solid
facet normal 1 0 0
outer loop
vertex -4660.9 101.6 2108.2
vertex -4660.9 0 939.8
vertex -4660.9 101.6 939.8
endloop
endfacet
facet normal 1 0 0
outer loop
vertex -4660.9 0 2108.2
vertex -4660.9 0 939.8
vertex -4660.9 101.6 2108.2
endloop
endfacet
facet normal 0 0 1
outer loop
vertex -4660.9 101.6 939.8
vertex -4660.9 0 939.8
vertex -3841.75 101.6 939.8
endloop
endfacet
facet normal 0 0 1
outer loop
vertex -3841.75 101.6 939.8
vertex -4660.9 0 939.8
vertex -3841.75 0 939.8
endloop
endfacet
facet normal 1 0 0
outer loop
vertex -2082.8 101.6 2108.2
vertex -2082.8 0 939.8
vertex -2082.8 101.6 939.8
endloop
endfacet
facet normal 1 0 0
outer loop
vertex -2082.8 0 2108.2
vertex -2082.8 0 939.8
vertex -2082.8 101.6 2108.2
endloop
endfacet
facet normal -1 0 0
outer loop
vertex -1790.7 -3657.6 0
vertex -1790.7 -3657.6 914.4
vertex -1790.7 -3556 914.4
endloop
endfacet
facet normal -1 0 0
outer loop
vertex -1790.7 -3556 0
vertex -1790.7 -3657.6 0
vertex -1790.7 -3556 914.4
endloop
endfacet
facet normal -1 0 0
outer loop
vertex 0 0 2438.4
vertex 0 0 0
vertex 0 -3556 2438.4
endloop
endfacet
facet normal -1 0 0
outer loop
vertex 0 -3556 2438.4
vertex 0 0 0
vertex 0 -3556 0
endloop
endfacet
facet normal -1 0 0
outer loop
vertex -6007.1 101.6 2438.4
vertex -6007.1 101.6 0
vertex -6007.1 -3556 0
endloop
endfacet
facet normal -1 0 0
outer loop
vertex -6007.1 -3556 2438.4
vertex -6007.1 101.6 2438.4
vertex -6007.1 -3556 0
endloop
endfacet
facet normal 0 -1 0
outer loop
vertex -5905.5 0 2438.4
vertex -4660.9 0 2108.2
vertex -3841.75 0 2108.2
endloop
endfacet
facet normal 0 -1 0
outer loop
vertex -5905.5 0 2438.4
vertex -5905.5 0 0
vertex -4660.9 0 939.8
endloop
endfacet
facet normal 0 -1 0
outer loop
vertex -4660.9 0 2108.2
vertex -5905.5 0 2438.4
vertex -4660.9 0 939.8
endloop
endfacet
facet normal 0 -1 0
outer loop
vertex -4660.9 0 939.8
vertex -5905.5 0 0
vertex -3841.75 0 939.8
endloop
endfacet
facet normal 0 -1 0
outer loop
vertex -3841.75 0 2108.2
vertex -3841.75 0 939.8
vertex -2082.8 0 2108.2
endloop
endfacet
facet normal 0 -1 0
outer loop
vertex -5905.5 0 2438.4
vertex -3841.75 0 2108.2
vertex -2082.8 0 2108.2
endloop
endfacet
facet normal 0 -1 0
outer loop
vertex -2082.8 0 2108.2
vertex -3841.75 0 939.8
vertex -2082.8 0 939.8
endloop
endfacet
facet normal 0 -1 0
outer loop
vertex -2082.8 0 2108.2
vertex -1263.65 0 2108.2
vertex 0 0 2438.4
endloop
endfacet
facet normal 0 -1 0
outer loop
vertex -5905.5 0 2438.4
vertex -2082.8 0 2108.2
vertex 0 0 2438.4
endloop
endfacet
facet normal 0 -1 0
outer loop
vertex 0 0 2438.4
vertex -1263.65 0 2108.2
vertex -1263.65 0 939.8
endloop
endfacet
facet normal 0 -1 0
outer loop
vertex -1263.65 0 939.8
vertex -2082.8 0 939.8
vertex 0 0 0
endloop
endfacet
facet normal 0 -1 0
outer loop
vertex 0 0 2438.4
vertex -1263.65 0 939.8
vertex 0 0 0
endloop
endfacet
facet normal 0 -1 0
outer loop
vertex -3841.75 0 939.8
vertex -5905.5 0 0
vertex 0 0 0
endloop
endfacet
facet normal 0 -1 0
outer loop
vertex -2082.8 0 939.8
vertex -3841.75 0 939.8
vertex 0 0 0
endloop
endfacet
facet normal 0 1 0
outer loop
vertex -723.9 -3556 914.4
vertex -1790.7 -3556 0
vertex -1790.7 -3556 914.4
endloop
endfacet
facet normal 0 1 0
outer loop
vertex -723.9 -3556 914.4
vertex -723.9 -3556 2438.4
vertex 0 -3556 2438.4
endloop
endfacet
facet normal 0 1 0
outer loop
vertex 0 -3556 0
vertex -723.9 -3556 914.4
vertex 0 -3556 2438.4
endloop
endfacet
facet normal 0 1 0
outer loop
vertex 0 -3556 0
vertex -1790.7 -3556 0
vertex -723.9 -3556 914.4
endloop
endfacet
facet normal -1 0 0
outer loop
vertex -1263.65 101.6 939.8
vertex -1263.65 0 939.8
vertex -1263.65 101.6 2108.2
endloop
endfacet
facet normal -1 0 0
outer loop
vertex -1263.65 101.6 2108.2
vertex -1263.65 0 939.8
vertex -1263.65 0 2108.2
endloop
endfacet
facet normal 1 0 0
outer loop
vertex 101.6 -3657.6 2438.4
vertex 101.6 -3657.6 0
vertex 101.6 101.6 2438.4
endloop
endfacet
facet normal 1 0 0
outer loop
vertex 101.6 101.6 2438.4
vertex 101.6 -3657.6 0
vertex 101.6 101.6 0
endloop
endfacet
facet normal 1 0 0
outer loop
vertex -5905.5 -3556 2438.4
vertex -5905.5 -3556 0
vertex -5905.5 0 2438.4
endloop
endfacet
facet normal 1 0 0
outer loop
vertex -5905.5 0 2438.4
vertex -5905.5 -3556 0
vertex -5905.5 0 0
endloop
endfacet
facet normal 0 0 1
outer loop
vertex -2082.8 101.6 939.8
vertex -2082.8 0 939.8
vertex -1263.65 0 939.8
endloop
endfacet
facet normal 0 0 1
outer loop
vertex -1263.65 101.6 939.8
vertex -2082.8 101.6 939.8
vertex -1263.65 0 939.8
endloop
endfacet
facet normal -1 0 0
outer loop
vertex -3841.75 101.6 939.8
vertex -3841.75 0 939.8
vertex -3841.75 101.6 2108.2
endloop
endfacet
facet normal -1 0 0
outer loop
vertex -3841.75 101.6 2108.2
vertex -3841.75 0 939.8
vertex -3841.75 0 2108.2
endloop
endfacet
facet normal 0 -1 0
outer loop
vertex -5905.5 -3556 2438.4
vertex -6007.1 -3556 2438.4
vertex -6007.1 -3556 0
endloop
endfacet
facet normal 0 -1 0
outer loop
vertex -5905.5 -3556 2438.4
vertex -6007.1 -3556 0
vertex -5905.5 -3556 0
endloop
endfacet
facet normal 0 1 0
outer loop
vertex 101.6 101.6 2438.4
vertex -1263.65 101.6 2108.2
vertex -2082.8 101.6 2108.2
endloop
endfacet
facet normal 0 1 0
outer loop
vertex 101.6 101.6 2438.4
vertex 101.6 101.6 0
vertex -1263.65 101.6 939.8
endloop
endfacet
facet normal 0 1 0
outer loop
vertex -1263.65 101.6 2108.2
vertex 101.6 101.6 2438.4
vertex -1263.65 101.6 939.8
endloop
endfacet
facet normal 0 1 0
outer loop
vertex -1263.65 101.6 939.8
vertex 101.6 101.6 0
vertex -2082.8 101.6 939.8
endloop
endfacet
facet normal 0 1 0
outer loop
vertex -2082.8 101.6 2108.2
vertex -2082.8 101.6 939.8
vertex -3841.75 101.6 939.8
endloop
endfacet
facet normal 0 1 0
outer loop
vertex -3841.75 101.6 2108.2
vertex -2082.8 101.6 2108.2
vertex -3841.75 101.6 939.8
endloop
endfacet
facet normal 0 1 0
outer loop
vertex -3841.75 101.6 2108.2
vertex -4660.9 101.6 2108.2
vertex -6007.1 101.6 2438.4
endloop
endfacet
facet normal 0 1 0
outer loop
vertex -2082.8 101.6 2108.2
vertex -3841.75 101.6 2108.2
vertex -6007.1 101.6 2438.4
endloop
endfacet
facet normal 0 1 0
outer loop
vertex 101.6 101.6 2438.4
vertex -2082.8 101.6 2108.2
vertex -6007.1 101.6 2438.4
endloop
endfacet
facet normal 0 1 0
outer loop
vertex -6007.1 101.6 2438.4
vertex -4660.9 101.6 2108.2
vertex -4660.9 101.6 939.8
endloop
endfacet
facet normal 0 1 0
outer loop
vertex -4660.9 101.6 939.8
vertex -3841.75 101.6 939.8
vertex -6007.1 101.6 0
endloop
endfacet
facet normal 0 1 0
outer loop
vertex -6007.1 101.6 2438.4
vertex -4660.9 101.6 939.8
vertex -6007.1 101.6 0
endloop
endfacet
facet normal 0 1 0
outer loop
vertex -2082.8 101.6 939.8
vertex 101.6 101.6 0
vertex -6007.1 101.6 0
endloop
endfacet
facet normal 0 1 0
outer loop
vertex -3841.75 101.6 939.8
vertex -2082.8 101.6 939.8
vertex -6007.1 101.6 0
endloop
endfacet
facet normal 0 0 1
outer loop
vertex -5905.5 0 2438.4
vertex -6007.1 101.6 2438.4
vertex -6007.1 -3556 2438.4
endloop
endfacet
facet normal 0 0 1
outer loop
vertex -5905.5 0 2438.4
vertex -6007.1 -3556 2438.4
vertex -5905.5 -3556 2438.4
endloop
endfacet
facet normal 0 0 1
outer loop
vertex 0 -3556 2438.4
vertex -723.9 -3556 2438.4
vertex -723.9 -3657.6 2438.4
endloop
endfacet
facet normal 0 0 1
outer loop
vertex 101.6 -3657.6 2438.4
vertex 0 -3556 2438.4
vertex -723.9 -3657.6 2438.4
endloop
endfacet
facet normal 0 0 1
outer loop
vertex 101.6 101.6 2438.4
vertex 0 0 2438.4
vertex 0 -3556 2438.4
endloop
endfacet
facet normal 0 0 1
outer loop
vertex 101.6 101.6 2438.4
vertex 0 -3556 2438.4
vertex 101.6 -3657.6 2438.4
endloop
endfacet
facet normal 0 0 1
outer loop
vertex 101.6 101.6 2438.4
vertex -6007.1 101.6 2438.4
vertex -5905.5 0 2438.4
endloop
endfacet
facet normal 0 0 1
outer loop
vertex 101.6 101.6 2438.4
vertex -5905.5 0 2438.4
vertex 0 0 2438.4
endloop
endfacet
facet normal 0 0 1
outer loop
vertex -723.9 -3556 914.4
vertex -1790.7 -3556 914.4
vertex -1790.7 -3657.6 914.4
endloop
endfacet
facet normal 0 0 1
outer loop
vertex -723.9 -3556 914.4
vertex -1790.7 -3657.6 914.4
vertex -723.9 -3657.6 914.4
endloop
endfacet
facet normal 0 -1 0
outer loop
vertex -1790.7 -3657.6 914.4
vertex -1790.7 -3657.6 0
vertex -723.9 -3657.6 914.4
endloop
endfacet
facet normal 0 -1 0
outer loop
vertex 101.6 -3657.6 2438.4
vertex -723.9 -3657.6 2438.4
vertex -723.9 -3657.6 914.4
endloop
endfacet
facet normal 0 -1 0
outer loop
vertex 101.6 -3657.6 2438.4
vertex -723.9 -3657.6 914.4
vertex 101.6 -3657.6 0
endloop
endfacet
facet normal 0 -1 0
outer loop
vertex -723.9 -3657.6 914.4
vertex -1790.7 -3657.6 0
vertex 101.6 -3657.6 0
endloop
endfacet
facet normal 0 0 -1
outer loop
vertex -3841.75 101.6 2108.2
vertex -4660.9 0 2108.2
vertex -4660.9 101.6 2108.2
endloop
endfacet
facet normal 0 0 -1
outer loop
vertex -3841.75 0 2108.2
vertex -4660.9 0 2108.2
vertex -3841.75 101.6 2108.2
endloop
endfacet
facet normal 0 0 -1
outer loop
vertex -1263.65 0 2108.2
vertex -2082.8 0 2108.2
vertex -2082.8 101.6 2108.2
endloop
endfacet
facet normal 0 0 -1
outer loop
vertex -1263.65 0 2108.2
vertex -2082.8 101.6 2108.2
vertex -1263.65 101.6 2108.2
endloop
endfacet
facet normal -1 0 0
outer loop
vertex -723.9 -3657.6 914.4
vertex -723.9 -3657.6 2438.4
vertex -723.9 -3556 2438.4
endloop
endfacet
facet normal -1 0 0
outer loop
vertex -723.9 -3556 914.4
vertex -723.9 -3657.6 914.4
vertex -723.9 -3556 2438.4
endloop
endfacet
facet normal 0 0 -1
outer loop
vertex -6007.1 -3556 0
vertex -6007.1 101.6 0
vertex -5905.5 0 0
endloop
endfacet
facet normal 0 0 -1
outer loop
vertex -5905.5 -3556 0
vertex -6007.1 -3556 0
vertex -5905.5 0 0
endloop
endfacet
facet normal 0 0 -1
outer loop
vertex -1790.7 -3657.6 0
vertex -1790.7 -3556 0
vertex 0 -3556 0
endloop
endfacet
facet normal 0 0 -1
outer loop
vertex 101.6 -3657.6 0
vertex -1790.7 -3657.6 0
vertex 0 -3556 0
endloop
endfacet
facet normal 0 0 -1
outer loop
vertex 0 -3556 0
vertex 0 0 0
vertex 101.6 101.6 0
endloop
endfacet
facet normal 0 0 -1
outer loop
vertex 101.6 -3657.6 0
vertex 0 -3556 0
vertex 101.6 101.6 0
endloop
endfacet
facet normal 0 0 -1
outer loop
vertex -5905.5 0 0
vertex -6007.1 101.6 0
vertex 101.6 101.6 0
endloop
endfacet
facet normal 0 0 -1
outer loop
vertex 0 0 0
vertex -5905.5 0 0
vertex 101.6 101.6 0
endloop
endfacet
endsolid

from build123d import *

# Parameters (mm, degrees)
F0_W     = 723.9
F0_H     = 101.6
F0_W_2   = 101.6
F0_H_2   = 3556
F0_W_3   = 5905.5
F1_DEPTH = 2438.4
F2_W     = 1066.8
F2_H     = 101.6
F3_DEPTH = 914.4
F4_W     = 819.15
F4_H     = 1168.4
F5_DEPTH = 101.6


with BuildPart() as f1:
    # F0 (on Top) → F1 (new body)
    with BuildSketch(Plane.XY):
        with Locations((-361.95, -3606.8)):
            Rectangle(F0_W, F0_H)
        with Locations((50.8, -3606.8)):
            Rectangle(F0_W_2, F0_H)
        with Locations((50.8, -1778)):
            Rectangle(F0_W_2, F0_H_2)
        with Locations((50.8, 50.8)):
            Rectangle(F0_W_2, F0_H)
        with Locations((-2952.75, 50.8)):
            Rectangle(F0_W_3, F0_H)
        Polygon((-5905.5, -3556), (-5905.5, 0), (-5905.5, 101.6), (-6007.1, 101.6), (-6007.1, -3556), align=None)
    extrude(amount=F1_DEPTH)

    # F2 (on Top) → F3 (join)
    with BuildSketch(Plane.XY):
        with Locations((-1257.3, -3606.8)):
            Rectangle(F2_W, F2_H)
    extrude(amount=F3_DEPTH)

    # F4 (on face) → F5 (cut, through all)
    with BuildSketch(Plane.XZ):
        with Locations((-1673.225, 1524)):
            Rectangle(F4_W, F4_H)
        with Locations((-4251.325, 1524)):
            Rectangle(F4_W, F4_H)
    extrude(amount=-F5_DEPTH, mode=Mode.SUBTRACT)


solid = f1.part
